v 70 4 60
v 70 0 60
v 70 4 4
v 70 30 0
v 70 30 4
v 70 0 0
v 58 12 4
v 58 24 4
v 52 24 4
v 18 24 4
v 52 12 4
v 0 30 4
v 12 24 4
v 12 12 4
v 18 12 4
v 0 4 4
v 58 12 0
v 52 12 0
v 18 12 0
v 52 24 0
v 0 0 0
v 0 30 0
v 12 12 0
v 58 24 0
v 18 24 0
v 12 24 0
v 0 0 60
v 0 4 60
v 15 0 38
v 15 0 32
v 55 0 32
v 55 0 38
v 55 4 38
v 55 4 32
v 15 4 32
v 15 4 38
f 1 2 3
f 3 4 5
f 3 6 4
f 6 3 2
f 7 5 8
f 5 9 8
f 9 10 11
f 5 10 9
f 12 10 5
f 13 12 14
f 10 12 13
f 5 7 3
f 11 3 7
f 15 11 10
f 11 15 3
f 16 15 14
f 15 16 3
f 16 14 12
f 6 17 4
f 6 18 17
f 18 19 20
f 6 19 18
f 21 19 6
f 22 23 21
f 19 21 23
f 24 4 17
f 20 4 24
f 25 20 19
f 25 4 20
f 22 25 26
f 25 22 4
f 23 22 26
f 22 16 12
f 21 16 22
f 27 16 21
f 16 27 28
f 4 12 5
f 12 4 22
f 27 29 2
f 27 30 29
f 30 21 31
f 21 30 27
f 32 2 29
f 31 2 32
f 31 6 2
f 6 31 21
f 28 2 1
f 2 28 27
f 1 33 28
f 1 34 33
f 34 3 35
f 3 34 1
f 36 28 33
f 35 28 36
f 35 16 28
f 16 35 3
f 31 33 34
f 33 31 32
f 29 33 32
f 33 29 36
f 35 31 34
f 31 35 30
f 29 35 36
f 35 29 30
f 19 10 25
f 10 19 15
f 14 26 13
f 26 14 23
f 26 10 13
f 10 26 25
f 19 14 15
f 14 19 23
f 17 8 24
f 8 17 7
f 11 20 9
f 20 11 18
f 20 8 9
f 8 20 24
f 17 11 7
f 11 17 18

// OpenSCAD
// Original MechIntel educational model. CC0-1.0. Units: mm.
// Not a standardized or load-rated component.
$fn=96;
width=70;
depth=30;
height=60;
wall=4;
slot_width=6;
$fn=64;
difference(){union(){
translate([0,0,0]) cube([width,depth,wall]);
translate([0,0,wall]) cube([width,wall,height-wall]);
}
translate([15,-1,32]) cube([40,wall+2,slot_width]);
translate([12,12,-1]) cube([slot_width,12,wall+2]);
translate([52,12,-1]) cube([slot_width,12,wall+2]);
}
